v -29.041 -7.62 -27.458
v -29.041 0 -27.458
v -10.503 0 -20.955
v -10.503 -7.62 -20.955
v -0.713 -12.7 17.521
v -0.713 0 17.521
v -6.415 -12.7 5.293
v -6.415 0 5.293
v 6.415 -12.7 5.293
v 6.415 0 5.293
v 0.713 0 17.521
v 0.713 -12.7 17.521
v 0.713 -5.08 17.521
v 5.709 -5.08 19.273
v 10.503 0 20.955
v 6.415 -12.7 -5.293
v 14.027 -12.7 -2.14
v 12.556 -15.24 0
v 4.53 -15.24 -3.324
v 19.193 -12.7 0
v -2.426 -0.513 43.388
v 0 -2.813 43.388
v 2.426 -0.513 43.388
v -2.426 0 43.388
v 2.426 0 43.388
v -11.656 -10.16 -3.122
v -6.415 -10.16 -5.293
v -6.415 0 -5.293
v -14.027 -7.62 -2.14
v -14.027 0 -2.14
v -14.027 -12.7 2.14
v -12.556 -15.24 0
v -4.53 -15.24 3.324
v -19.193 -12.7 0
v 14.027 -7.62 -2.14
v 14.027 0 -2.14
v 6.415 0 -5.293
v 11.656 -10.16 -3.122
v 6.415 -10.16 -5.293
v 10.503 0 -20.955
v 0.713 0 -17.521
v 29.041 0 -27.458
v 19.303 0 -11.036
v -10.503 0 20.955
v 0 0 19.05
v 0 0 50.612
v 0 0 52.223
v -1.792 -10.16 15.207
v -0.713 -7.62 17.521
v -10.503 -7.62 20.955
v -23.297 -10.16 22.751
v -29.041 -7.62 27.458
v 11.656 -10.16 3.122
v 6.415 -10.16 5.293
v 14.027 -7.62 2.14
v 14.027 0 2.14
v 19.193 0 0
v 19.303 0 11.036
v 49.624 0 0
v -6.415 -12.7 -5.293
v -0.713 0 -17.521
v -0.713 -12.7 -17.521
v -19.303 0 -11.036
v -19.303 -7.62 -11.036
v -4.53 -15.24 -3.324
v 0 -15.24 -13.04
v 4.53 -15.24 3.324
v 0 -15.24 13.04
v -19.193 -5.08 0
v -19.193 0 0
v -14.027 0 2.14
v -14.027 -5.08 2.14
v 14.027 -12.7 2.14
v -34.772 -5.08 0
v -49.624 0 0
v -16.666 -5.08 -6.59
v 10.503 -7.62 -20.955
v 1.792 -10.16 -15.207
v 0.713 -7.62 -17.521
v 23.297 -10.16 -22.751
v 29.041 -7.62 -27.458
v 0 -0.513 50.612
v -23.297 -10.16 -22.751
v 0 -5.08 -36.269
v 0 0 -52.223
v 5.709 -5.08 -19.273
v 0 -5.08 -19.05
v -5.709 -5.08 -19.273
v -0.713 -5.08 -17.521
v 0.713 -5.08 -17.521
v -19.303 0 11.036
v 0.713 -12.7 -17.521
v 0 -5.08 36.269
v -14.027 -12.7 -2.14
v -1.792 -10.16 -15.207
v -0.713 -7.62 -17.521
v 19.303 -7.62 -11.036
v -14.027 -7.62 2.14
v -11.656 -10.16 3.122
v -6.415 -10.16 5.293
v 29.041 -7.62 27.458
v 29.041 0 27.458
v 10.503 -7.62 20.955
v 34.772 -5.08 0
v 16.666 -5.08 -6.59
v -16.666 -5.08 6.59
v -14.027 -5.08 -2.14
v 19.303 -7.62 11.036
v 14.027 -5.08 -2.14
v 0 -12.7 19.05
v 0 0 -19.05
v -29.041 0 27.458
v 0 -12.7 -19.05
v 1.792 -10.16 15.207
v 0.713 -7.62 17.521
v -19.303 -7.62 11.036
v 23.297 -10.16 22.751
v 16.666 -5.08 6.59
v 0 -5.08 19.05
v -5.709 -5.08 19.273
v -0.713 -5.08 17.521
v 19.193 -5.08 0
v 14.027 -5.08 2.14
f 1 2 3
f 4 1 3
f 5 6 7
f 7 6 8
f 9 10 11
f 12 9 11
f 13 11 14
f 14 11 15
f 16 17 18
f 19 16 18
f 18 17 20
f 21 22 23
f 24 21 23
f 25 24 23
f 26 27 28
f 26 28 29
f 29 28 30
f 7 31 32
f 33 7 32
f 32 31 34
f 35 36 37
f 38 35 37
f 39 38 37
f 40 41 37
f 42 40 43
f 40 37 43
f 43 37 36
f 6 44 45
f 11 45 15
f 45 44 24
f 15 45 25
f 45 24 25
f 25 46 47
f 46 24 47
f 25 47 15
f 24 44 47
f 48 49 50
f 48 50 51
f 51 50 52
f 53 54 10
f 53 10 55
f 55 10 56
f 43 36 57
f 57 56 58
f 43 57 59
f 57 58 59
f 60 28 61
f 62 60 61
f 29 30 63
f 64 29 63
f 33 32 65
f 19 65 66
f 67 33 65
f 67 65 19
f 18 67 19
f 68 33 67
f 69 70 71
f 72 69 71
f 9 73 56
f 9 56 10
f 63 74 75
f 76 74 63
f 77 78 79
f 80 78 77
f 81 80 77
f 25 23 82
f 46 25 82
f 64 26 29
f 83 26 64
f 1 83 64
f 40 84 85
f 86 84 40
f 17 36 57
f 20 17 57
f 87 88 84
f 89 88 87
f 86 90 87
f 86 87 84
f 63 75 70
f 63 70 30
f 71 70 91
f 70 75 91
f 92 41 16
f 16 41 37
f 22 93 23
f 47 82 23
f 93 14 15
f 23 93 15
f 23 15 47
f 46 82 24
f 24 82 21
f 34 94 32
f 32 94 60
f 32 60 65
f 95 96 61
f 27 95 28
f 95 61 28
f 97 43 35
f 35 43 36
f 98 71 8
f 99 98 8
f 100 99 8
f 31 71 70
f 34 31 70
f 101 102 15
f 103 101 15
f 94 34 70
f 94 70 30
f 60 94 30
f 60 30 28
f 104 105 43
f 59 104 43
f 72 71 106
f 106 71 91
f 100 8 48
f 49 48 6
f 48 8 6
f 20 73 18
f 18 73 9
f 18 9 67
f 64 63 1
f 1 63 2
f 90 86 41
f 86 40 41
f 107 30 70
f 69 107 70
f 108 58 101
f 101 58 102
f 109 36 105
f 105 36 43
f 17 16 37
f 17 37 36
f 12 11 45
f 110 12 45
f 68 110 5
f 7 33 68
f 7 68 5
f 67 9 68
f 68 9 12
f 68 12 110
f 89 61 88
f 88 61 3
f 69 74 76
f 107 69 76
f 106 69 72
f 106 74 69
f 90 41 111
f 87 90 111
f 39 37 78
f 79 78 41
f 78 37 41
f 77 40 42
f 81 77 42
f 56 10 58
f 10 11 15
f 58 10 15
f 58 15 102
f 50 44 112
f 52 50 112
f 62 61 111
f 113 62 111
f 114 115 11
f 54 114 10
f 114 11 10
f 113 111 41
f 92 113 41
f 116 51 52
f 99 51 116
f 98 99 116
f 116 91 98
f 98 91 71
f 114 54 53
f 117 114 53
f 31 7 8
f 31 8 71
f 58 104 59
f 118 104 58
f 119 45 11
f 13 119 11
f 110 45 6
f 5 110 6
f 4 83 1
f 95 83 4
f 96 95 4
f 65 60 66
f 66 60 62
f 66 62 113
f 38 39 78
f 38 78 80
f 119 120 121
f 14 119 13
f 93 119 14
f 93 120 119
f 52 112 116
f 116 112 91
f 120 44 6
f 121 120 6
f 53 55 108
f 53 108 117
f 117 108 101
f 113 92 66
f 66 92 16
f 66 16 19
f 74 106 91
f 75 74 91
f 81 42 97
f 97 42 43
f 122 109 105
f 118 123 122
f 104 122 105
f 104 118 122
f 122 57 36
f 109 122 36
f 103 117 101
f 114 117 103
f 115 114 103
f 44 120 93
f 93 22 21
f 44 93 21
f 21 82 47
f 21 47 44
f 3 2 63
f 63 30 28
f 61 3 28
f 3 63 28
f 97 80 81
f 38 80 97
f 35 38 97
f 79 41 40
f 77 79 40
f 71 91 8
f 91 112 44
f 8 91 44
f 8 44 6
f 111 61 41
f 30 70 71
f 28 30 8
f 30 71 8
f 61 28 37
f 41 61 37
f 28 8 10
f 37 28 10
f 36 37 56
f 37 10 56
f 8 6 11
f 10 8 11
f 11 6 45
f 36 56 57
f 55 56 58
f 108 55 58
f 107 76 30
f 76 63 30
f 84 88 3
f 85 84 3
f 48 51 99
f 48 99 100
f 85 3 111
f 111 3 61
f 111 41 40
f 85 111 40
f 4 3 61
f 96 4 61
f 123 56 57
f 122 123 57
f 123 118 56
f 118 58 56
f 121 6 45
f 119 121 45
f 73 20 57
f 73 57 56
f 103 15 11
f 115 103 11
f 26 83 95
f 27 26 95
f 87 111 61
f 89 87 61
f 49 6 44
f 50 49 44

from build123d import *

# Parameters (mm, degrees)
F1_DEPTH       = 5.08
F2_DEPTH       = 10.16
F3_DEPTH       = 15.24
F5_DEPTH       = 25.4
F6_T1_DEPTH    = 43.0847621983
F6_T3_DEPTH    = 42.4996652057
F6_2_T1_DEPTH  = 42.4996652057
F6_2_T3_DEPTH  = 43.0847621983
F6_3_T1_DEPTH  = 43.0847621983
F6_3_T3_DEPTH  = 42.4996652057
F6_4_T1_DEPTH  = 42.4996652057
F6_4_T3_DEPTH  = 43.0847621983
F6_5_T4_DEPTH  = 28.2434080268
F6_5_T9_DEPTH  = 28.2434080268
F6_5_T14_DEPTH = 26.8952157279
F6_5_T19_DEPTH = 26.8952157279
F6_5_T24_DEPTH = 28.2434080268
F6_5_T29_DEPTH = 28.2434080268
F6_5_T34_DEPTH = 26.8952157279
F6_5_T39_DEPTH = 26.8952157279
F6_5_T45_DEPTH = 28.2434080268
F6_5_T49_DEPTH = 26.8952157279
F6_5_T56_DEPTH = 26.8952157279
F6_5_T60_DEPTH = 28.2434080268
F6_5_T67_DEPTH = 28.2434080268
F6_5_T71_DEPTH = 26.8952157279
F6_5_T78_DEPTH = 26.8952157279
F6_5_T82_DEPTH = 28.2434080268
F7_C1_SIZE     = 5.0799
F7_C2_SIZE     = 5.0799
F7_2_T1_DEPTH  = 59.1132304118
F7_2_T3_DEPTH  = 59.1132304118
F7_3_C1_SIZE   = 5.0799
F7_3_C2_SIZE   = 5.0799
F7_4_C1_SIZE   = 5.0799
F7_4_C2_SIZE   = 5.0799


# Not quite as in the source:
# - a fillet or chamfer that OpenCascade refuses, or shapes differently, is made with other operations: its cross-section is extruded or revolved along the edge and cut away or added
# - a fillet or chamfer is up to 0.001 mm smaller than in the source, because OpenCascade refuses the exact size


with BuildPart() as f1:
    # F0 (on Front) → F1 (new body)
    with BuildSketch(Plane.XZ):
        Polygon((-19.1932707477, 0), (-49.6243569425, 0), (-19.302516341, -11.0362474271), (-14.0268384734, -2.1400063171), align=None)
        Polygon((-19.302516341, 11.0362474271), (-49.6243569425, 0), (-19.1932707477, 0), (-14.0268384734, 2.1400063171), align=None)
    extrude(amount=F1_DEPTH)

    # F7: chamfer of 5.08 on 2 edges, made by hand

    # F7_c1 (size 5.08 in the source; OpenCascade refuses exactly that, so slightly less here)
    f7_c1_edges = [f1.edges().sort_by_distance(p)[0] for p in [
        (-34.4634366418, -5.08, 5.5181237136),
    ]]
    chamfer(f7_c1_edges, length=F7_C1_SIZE)

    # F7_c2 (size 5.08 in the source; OpenCascade refuses exactly that, so slightly less here)
    f7_c2_edges = [f1.edges().sort_by_distance(p)[0] for p in [
        (-30.7502781487, -5.08, -6.8696028802),
    ]]
    chamfer(f7_c2_edges, length=F7_C2_SIZE)


with BuildPart() as f1b:
    # F0 (on Front) → F1, piece 2 (new body)
    with BuildSketch(Plane.XZ):
        Polygon((10.5027486839, 20.9549840158), (0, 52.2231460967), (0, 19.05), (0.7131063295, 17.5207385413), align=None)
        Polygon((0, 52.2231460967), (-10.5027486839, 20.9549840158), (-0.7131063295, 17.5207385413), (0, 19.05), align=None)
    extrude(amount=F1_DEPTH)

    # F4 (on face) → F5 (cut)
    with BuildSketch(Plane.XZ.offset(5.08)):
        Polygon((2.4262880633, 43.3883815264), (0, 50.611782819), (-2.4262880633, 43.3883815264), align=None)
    extrude(amount=-F5_DEPTH, mode=Mode.SUBTRACT)

    # F7#2: chamfer of 5.08 on 2 edges, made by hand

    # F7_2_s2 → F7_2_t1 (cut)
    with BuildSketch(Plane(origin=(-1.1004277598, 0, 3.2761284296), x_dir=(0, 1, 0), z_dir=(-0.318410507, 0, 0.9479529255))):
        Polygon((-5.08, -11.5483984258), (0, -16.6283984258), (-5.08, -16.6283984258), align=None)
    extrude(amount=F7_2_T1_DEPTH, mode=Mode.SUBTRACT)

    # F7_2_s4 → F7_2_t3 (cut)
    with BuildSketch(Plane(origin=(19.9227014256, 0, 59.3126881363), x_dir=(0, 1, 0), z_dir=(-0.318410507, 0, -0.9479529255))):
        Polygon((-5.08, -11.5483984258), (0, -16.6283984258), (-5.08, -16.6283984258), align=None)
    extrude(amount=F7_2_T3_DEPTH, mode=Mode.SUBTRACT)


with BuildPart() as f1c:
    # F0 (on Front) → F1, piece 3 (new body)
    with BuildSketch(Plane.XZ):
        Polygon((49.6243569425, 0), (19.302516341, 11.0362474271), (14.0268384734, 2.1400063171), (19.1932707477, 0), align=None)
        Polygon((14.0268384734, -2.1400063171), (19.302516341, -11.0362474271), (49.6243569425, 0), (19.1932707477, 0), align=None)
    extrude(amount=F1_DEPTH)

    # F7#3: chamfer of 5.08 on 2 edges, made by hand

    # F7_3_c1 (size 5.08 in the source; OpenCascade refuses exactly that, so slightly less here)
    f7_3_c1_edges = [f1c.edges().sort_by_distance(p)[0] for p in [
        (34.4634366418, -5.08, -5.5181237136),
    ]]
    chamfer(f7_3_c1_edges, length=F7_3_C1_SIZE)

    # F7_3_c2 (size 5.08 in the source; OpenCascade refuses exactly that, so slightly less here)
    f7_3_c2_edges = [f1c.edges().sort_by_distance(p)[0] for p in [
        (30.7502781487, -5.08, 6.8696028802),
    ]]
    chamfer(f7_3_c2_edges, length=F7_3_C2_SIZE)


with BuildPart() as f1d:
    # F0 (on Front) → F1, piece 4 (new body)
    with BuildSketch(Plane.XZ):
        Polygon((0, -19.05), (0, -52.2231460967), (10.5027486839, -20.9549840158), (0.7131063295, -17.5207385413), align=None)
        Polygon((-0.7131063295, -17.5207385413), (-10.5027486839, -20.9549840158), (0, -52.2231460967), (0, -19.05), align=None)
    extrude(amount=F1_DEPTH)

    # F7#4: chamfer of 5.08 on 2 edges, made by hand

    # F7_4_c1 (size 5.08 in the source; OpenCascade refuses exactly that, so slightly less here)
    f7_4_c1_edges = [f1d.edges().sort_by_distance(p)[0] for p in [
        (-5.251374342, -5.08, -36.5890650563),
    ]]
    chamfer(f7_4_c1_edges, length=F7_4_C1_SIZE)

    # F7_4_c2 (size 5.08 in the source; OpenCascade refuses exactly that, so slightly less here)
    f7_4_c2_edges = [f1d.edges().sort_by_distance(p)[0] for p in [
        (6.591076943, -5.08, -32.6005817239),
    ]]
    chamfer(f7_4_c2_edges, length=F7_4_C2_SIZE)


with BuildPart() as f2:
    # F0 (on Front) → F2 (new body)
    with BuildSketch(Plane.XZ):
        Polygon((-29.0412037669, 27.4583477923), (-19.302516341, 11.0362474271), (-14.0268384734, 2.1400063171), (-6.4150318198, 5.2929198672), (-0.7131063295, 17.5207385413), (-10.5027486839, 20.9549840158), align=None)
    extrude(amount=F2_DEPTH)

    # F6: chamfer of 2.54 on 2 edges, made by hand

    # F6_s2 → F6_t1 (cut)
    with BuildSketch(Plane(origin=(-40.5997078736, 0, 14.2425390001), x_dir=(0, 1, 0), z_dir=(0.9436215642, 0, -0.3310261978))):
        Polygon((-7.62, 16.296889831), (-10.16, 13.756889831), (-10.16, 16.296889831), align=None)
    extrude(amount=F6_T1_DEPTH, mode=Mode.SUBTRACT)

    # F6_s4 → F6_t3 (cut)
    with BuildSketch(Plane(origin=(-1.256506008, 0, 2.1188140527), x_dir=(0, 1, 0), z_dir=(-0.5100765172, 0, 0.860129029))):
        Polygon((-10.16, 8.4333239875), (-7.62, 10.9733239875), (-10.16, 10.9733239875), align=None)
    extrude(amount=F6_T3_DEPTH, mode=Mode.SUBTRACT)


with BuildPart() as f2b:
    # F0 (on Front) → F2, piece 2 (new body)
    with BuildSketch(Plane.XZ):
        Polygon((-14.0268384734, -2.1400063171), (-19.302516341, -11.0362474271), (-29.0412037669, -27.4583477923), (-10.5027486839, -20.9549840158), (-0.7131063295, -17.5207385413), (-6.4150318198, -5.2929198672), align=None)
    extrude(amount=F2_DEPTH)

    # F6#2: chamfer of 2.54 on 2 edges, made by hand

    # F6_2_s2 → F6_2_t1 (cut)
    with BuildSketch(Plane(origin=(-22.934587219, 0, -38.6740098203), x_dir=(0, 1, 0), z_dir=(0.5100765172, 0, 0.860129029))):
        Polygon((-10.16, 8.4333239875), (-7.62, 10.9733239875), (-10.16, 10.9733239875), align=None)
    extrude(amount=F6_2_T1_DEPTH, mode=Mode.SUBTRACT)

    # F6_2_s4 → F6_2_t3 (cut)
    with BuildSketch(Plane(origin=(0.056002824, 0, 0.0196460134), x_dir=(0, 1, 0), z_dir=(-0.9436215642, 0, -0.3310261978))):
        Polygon((-10.16, 13.756889831), (-7.62, 16.296889831), (-10.16, 16.296889831), align=None)
    extrude(amount=F6_2_T3_DEPTH, mode=Mode.SUBTRACT)


with BuildPart() as f2c:
    # F0 (on Front) → F2, piece 3 (new body)
    with BuildSketch(Plane.XZ):
        Polygon((0.7131063295, -17.5207385413), (10.5027486839, -20.9549840158), (29.0412037669, -27.4583477923), (19.302516341, -11.0362474271), (14.0268384734, -2.1400063171), (6.4150318198, -5.2929198672), align=None)
    extrude(amount=F2_DEPTH)

    # F6#3: chamfer of 2.54 on 2 edges, made by hand

    # F6_3_s2 → F6_3_t1 (cut)
    with BuildSketch(Plane(origin=(40.5997078736, 0, -14.2425390001), x_dir=(0, 1, 0), z_dir=(-0.9436215642, 0, 0.3310261978))):
        Polygon((-10.16, 13.756889831), (-7.62, 16.296889831), (-10.16, 16.296889831), align=None)
    extrude(amount=F6_3_T1_DEPTH, mode=Mode.SUBTRACT)

    # F6_3_s4 → F6_3_t3 (cut)
    with BuildSketch(Plane(origin=(1.256506008, 0, -2.1188140527), x_dir=(0, 1, 0), z_dir=(0.5100765172, 0, -0.860129029))):
        Polygon((-10.16, 8.4333239875), (-7.62, 10.9733239875), (-10.16, 10.9733239875), align=None)
    extrude(amount=F6_3_T3_DEPTH, mode=Mode.SUBTRACT)


with BuildPart() as f2d:
    # F0 (on Front) → F2, piece 4 (new body)
    with BuildSketch(Plane.XZ):
        Polygon((29.0412037669, 27.4583477923), (10.5027486839, 20.9549840158), (0.7131063295, 17.5207385413), (6.4150318198, 5.2929198672), (14.0268384734, 2.1400063171), (19.302516341, 11.0362474271), align=None)
    extrude(amount=F2_DEPTH)

    # F6#4: chamfer of 2.54 on 2 edges, made by hand

    # F6_4_s2 → F6_4_t1 (cut)
    with BuildSketch(Plane(origin=(22.934587219, 0, 38.6740098203), x_dir=(0, 1, 0), z_dir=(-0.5100765172, 0, -0.860129029))):
        Polygon((-7.62, 10.9733239875), (-10.16, 8.4333239875), (-10.16, 10.9733239875), align=None)
    extrude(amount=F6_4_T1_DEPTH, mode=Mode.SUBTRACT)

    # F6_4_s4 → F6_4_t3 (cut)
    with BuildSketch(Plane(origin=(-0.056002824, 0, -0.0196460134), x_dir=(0, 1, 0), z_dir=(0.9436215642, 0, 0.3310261978))):
        Polygon((-10.16, 13.756889831), (-7.62, 16.296889831), (-10.16, 16.296889831), align=None)
    extrude(amount=F6_4_T3_DEPTH, mode=Mode.SUBTRACT)


with BuildPart() as f3:
    # F0 (on Front) → F3 (new body)
    with BuildSketch(Plane.XZ):
        Polygon((-14.0268384734, 2.1400063171), (-19.1932707477, 0), (-14.0268384734, -2.1400063171), (-6.4150318198, -5.2929198672), (-0.7131063295, -17.5207385413), (0, -19.05), (0.7131063295, -17.5207385413), (6.4150318198, -5.2929198672), (14.0268384734, -2.1400063171), (19.1932707477, 0), (14.0268384734, 2.1400063171), (6.4150318198, 5.2929198672), (0.7131063295, 17.5207385413), (0, 19.05), (-0.7131063295, 17.5207385413), (-6.4150318198, 5.2929198672), align=None)
    extrude(amount=F3_DEPTH)

    # F6#5: chamfer of 2.54 on 8 edges, made by hand


with BuildPart() as f6_5_tool2:
    # F6_5_s3 → F6_5_t4 (new body)
    with BuildSketch(Plane(origin=(10.0571474138, 0, -21.5676222294), x_dir=(0, 1, 0), z_dir=(-0.4226182617, 0, 0.906307787))):
        Polygon((-12.7, 8.0508778862), (-15.24, 5.5108778862), (-15.24, 8.0508778862), align=None)
    extrude(amount=F6_5_T4_DEPTH)

    split(bisect_by=Plane(origin=(-2.8107894244, 0, -6.7858459494), x_dir=(0, 1, 0), z_dir=(-0.3826834324, 0, -0.9238795325)), keep=Keep.TOP)


with BuildPart() as f3_1:
    add(f3.part)

    # F6_5_t1: cut F6_5_tool2
    add(f6_5_tool2.part, mode=Mode.SUBTRACT)


with BuildPart() as f6_5_tool7:
    # F6_5_s8 → F6_5_t9 (new body)
    with BuildSketch(Plane(origin=(1.8790325922, 0, 4.0295983977), x_dir=(0, 1, 0), z_dir=(-0.4226182617, 0, -0.906307787))):
        Polygon((-12.7, 8.0508778862), (-15.24, 5.5108778862), (-15.24, 8.0508778862), align=None)
    extrude(amount=F6_5_T9_DEPTH)

    split(bisect_by=Plane(origin=(2.8107894244, 0, -6.7858459494), x_dir=(0, 1, 0), z_dir=(0.3826834324, 0, -0.9238795325)), keep=Keep.TOP)


with BuildPart() as f3_2:
    add(f3_1.part)

    # F6_5_t6: cut F6_5_tool7
    add(f6_5_tool7.part, mode=Mode.SUBTRACT)


with BuildPart() as f6_5_tool12:
    # F6_5_s13 → F6_5_t14 (new body)
    with BuildSketch(Plane(origin=(22.417331526, 0, 9.2855627503), x_dir=(0, 1, 0), z_dir=(-0.9238795325, 0, -0.3826834324))):
        Polygon((-12.7, 7.344946728), (-15.24, 4.804946728), (-15.24, 7.344946728), align=None)
    extrude(amount=F6_5_T14_DEPTH)

    split(bisect_by=Plane(origin=(7.2965733207, 0, -3.4024480177), x_dir=(0, 1, 0), z_dir=(0.906307787, 0, -0.4226182617)), keep=Keep.TOP)


with BuildPart() as f3_3:
    add(f3_2.part)

    # F6_5_t11: cut F6_5_tool12
    add(f6_5_tool12.part, mode=Mode.SUBTRACT)


with BuildPart() as f6_5_tool17:
    # F6_5_s18 → F6_5_t19 (new body)
    with BuildSketch(Plane(origin=(-2.4306078074, 0, 1.0067907186), x_dir=(0, 1, 0), z_dir=(0.9238795325, 0, -0.3826834324))):
        Polygon((-12.7, 7.344946728), (-15.24, 4.804946728), (-15.24, 7.344946728), align=None)
    extrude(amount=F6_5_T19_DEPTH)

    split(bisect_by=Plane(origin=(7.2965733207, 0, 3.4024480177), x_dir=(0, 1, 0), z_dir=(0.906307787, 0, 0.4226182617)), keep=Keep.TOP)


with BuildPart() as f3_4:
    add(f3_3.part)

    # F6_5_t16: cut F6_5_tool17
    add(f6_5_tool17.part, mode=Mode.SUBTRACT)


with BuildPart() as f6_5_tool22:
    # F6_5_s23 → F6_5_t24 (new body)
    with BuildSketch(Plane(origin=(-10.0571474138, 0, 21.5676222294), x_dir=(0, 1, 0), z_dir=(0.4226182617, 0, -0.906307787))):
        Polygon((-12.7, 8.0508778862), (-15.24, 5.5108778862), (-15.24, 8.0508778862), align=None)
    extrude(amount=F6_5_T24_DEPTH)

    split(bisect_by=Plane(origin=(2.8107894244, 0, 6.7858459494), x_dir=(0, 1, 0), z_dir=(0.3826834324, 0, 0.9238795325)), keep=Keep.TOP)


with BuildPart() as f3_5:
    add(f3_4.part)

    # F6_5_t21: cut F6_5_tool22
    add(f6_5_tool22.part, mode=Mode.SUBTRACT)


with BuildPart() as f6_5_tool27:
    # F6_5_s28 → F6_5_t29 (new body)
    with BuildSketch(Plane(origin=(-1.8790325922, 0, -4.0295983977), x_dir=(0, 1, 0), z_dir=(0.4226182617, 0, 0.906307787))):
        Polygon((-15.24, 5.5108778862), (-12.7, 8.0508778862), (-15.24, 8.0508778862), align=None)
    extrude(amount=F6_5_T29_DEPTH)

    split(bisect_by=Plane(origin=(-2.8107894244, 0, 6.7858459494), x_dir=(0, 1, 0), z_dir=(-0.3826834324, 0, 0.9238795325)), keep=Keep.TOP)


with BuildPart() as f3_6:
    add(f3_5.part)

    # F6_5_t26: cut F6_5_tool27
    add(f6_5_tool27.part, mode=Mode.SUBTRACT)


with BuildPart() as f6_5_tool32:
    # F6_5_s33 → F6_5_t34 (new body)
    with BuildSketch(Plane(origin=(-22.417331526, 0, -9.2855627503), x_dir=(0, 1, 0), z_dir=(0.9238795325, 0, 0.3826834324))):
        Polygon((-12.7, 7.344946728), (-15.24, 4.804946728), (-15.24, 7.344946728), align=None)
    extrude(amount=F6_5_T34_DEPTH)

    split(bisect_by=Plane(origin=(-7.2965733207, 0, 3.4024480177), x_dir=(0, 1, 0), z_dir=(-0.906307787, 0, 0.4226182617)), keep=Keep.TOP)


with BuildPart() as f3_7:
    add(f3_6.part)

    # F6_5_t31: cut F6_5_tool32
    add(f6_5_tool32.part, mode=Mode.SUBTRACT)


with BuildPart() as f6_5_tool37:
    # F6_5_s38 → F6_5_t39 (new body)
    with BuildSketch(Plane(origin=(2.4306078074, 0, -1.0067907186), x_dir=(0, 1, 0), z_dir=(-0.9238795325, 0, 0.3826834324))):
        Polygon((-12.7, 7.344946728), (-15.24, 4.804946728), (-15.24, 7.344946728), align=None)
    extrude(amount=F6_5_T39_DEPTH)

    split(bisect_by=Plane(origin=(-7.2965733207, 0, -3.4024480177), x_dir=(0, 1, 0), z_dir=(-0.906307787, 0, -0.4226182617)), keep=Keep.TOP)


with BuildPart() as f3_8:
    add(f3_7.part)

    # F6_5_t36: cut F6_5_tool37
    add(f6_5_tool37.part, mode=Mode.SUBTRACT)


with BuildPart() as f6_5_tool43:
    # F6_5_s44 → F6_5_t45 (new body)
    with BuildSketch(Plane(origin=(10.0571474138, 0, -21.5676222294), x_dir=(0, 1, 0), z_dir=(-0.4226182617, 0, 0.906307787))):
        Polygon((-12.7, 8.0508778862), (-15.24, 5.5108778862), (-15.24, 8.0508778862), align=None)
    extrude(amount=F6_5_T45_DEPTH)

    split(bisect_by=Plane(origin=(-2.8107894244, 0, -6.7858459494), x_dir=(0, 1, 0), z_dir=(0.3826834324, 0, 0.9238795325)), keep=Keep.TOP)


with BuildPart() as f6_5_tool47:
    # F6_5_s48 → F6_5_t49 (new body)
    with BuildSketch(Plane(origin=(2.4306078074, 0, -1.0067907186), x_dir=(0, 1, 0), z_dir=(-0.9238795325, 0, 0.3826834324))):
        Polygon((-12.7, 7.344946728), (-15.24, 4.804946728), (-15.24, 7.344946728), align=None)
    extrude(amount=F6_5_T49_DEPTH)

    split(bisect_by=Plane(origin=(-7.2965733207, 0, -3.4024480177), x_dir=(0, 1, 0), z_dir=(0.906307787, 0, 0.4226182617)), keep=Keep.TOP)


with BuildPart() as f6_5_tool43_1:
    add(f6_5_tool43.part)

    # F6_5_t51: intersect F6_5_tool47
    add(f6_5_tool47.part, mode=Mode.INTERSECT)


with BuildPart() as f3_9:
    add(f3_8.part)

    # F6_5_t41: cut F6_5_tool43
    add(f6_5_tool43_1.part, mode=Mode.SUBTRACT)


with BuildPart() as f6_5_tool54:
    # F6_5_s55 → F6_5_t56 (new body)
    with BuildSketch(Plane(origin=(22.417331526, 0, 9.2855627503), x_dir=(0, 1, 0), z_dir=(-0.9238795325, 0, -0.3826834324))):
        Polygon((-12.7, 7.344946728), (-15.24, 4.804946728), (-15.24, 7.344946728), align=None)
    extrude(amount=F6_5_T56_DEPTH)

    split(bisect_by=Plane(origin=(7.2965733207, 0, -3.4024480177), x_dir=(0, 1, 0), z_dir=(-0.906307787, 0, 0.4226182617)), keep=Keep.TOP)


with BuildPart() as f6_5_tool58:
    # F6_5_s59 → F6_5_t60 (new body)
    with BuildSketch(Plane(origin=(1.8790325922, 0, 4.0295983977), x_dir=(0, 1, 0), z_dir=(-0.4226182617, 0, -0.906307787))):
        Polygon((-12.7, 8.0508778862), (-15.24, 5.5108778862), (-15.24, 8.0508778862), align=None)
    extrude(amount=F6_5_T60_DEPTH)

    split(bisect_by=Plane(origin=(2.8107894244, 0, -6.7858459494), x_dir=(0, 1, 0), z_dir=(-0.3826834324, 0, 0.9238795325)), keep=Keep.TOP)


with BuildPart() as f6_5_tool54_1:
    add(f6_5_tool54.part)

    # F6_5_t62: intersect F6_5_tool58
    add(f6_5_tool58.part, mode=Mode.INTERSECT)


with BuildPart() as f3_10:
    add(f3_9.part)

    # F6_5_t52: cut F6_5_tool54
    add(f6_5_tool54_1.part, mode=Mode.SUBTRACT)


with BuildPart() as f6_5_tool65:
    # F6_5_s66 → F6_5_t67 (new body)
    with BuildSketch(Plane(origin=(-10.0571474138, 0, 21.5676222294), x_dir=(0, 1, 0), z_dir=(0.4226182617, 0, -0.906307787))):
        Polygon((-12.7, 8.0508778862), (-15.24, 5.5108778862), (-15.24, 8.0508778862), align=None)
    extrude(amount=F6_5_T67_DEPTH)

    split(bisect_by=Plane(origin=(2.8107894244, 0, 6.7858459494), x_dir=(0, 1, 0), z_dir=(-0.3826834324, 0, -0.9238795325)), keep=Keep.TOP)


with BuildPart() as f6_5_tool69:
    # F6_5_s70 → F6_5_t71 (new body)
    with BuildSketch(Plane(origin=(-2.4306078074, 0, 1.0067907186), x_dir=(0, 1, 0), z_dir=(0.9238795325, 0, -0.3826834324))):
        Polygon((-12.7, 7.344946728), (-15.24, 4.804946728), (-15.24, 7.344946728), align=None)
    extrude(amount=F6_5_T71_DEPTH)

    split(bisect_by=Plane(origin=(7.2965733207, 0, 3.4024480177), x_dir=(0, 1, 0), z_dir=(-0.906307787, 0, -0.4226182617)), keep=Keep.TOP)


with BuildPart() as f6_5_tool65_1:
    add(f6_5_tool65.part)

    # F6_5_t73: intersect F6_5_tool69
    add(f6_5_tool69.part, mode=Mode.INTERSECT)


with BuildPart() as f3_11:
    add(f3_10.part)

    # F6_5_t63: cut F6_5_tool65
    add(f6_5_tool65_1.part, mode=Mode.SUBTRACT)


with BuildPart() as f6_5_tool76:
    # F6_5_s77 → F6_5_t78 (new body)
    with BuildSketch(Plane(origin=(-22.417331526, 0, -9.2855627503), x_dir=(0, 1, 0), z_dir=(0.9238795325, 0, 0.3826834324))):
        Polygon((-12.7, 7.344946728), (-15.24, 4.804946728), (-15.24, 7.344946728), align=None)
    extrude(amount=F6_5_T78_DEPTH)

    split(bisect_by=Plane(origin=(-7.2965733207, 0, 3.4024480177), x_dir=(0, 1, 0), z_dir=(0.906307787, 0, -0.4226182617)), keep=Keep.TOP)


with BuildPart() as f6_5_tool80:
    # F6_5_s81 → F6_5_t82 (new body)
    with BuildSketch(Plane(origin=(-1.8790325922, 0, -4.0295983977), x_dir=(0, 1, 0), z_dir=(0.4226182617, 0, 0.906307787))):
        Polygon((-15.24, 5.5108778862), (-12.7, 8.0508778862), (-15.24, 8.0508778862), align=None)
    extrude(amount=F6_5_T82_DEPTH)

    split(bisect_by=Plane(origin=(-2.8107894244, 0, 6.7858459494), x_dir=(0, 1, 0), z_dir=(0.3826834324, 0, -0.9238795325)), keep=Keep.TOP)


with BuildPart() as f6_5_tool76_1:
    add(f6_5_tool76.part)

    # F6_5_t84: intersect F6_5_tool80
    add(f6_5_tool80.part, mode=Mode.INTERSECT)


with BuildPart() as f3_12:
    add(f3_11.part)

    # F6_5_t74: cut F6_5_tool76
    add(f6_5_tool76_1.part, mode=Mode.SUBTRACT)


solid = Compound([f1.part, f1b.part, f1c.part, f1d.part, f2.part, f2b.part, f2c.part, f2d.part, f3_12.part])
